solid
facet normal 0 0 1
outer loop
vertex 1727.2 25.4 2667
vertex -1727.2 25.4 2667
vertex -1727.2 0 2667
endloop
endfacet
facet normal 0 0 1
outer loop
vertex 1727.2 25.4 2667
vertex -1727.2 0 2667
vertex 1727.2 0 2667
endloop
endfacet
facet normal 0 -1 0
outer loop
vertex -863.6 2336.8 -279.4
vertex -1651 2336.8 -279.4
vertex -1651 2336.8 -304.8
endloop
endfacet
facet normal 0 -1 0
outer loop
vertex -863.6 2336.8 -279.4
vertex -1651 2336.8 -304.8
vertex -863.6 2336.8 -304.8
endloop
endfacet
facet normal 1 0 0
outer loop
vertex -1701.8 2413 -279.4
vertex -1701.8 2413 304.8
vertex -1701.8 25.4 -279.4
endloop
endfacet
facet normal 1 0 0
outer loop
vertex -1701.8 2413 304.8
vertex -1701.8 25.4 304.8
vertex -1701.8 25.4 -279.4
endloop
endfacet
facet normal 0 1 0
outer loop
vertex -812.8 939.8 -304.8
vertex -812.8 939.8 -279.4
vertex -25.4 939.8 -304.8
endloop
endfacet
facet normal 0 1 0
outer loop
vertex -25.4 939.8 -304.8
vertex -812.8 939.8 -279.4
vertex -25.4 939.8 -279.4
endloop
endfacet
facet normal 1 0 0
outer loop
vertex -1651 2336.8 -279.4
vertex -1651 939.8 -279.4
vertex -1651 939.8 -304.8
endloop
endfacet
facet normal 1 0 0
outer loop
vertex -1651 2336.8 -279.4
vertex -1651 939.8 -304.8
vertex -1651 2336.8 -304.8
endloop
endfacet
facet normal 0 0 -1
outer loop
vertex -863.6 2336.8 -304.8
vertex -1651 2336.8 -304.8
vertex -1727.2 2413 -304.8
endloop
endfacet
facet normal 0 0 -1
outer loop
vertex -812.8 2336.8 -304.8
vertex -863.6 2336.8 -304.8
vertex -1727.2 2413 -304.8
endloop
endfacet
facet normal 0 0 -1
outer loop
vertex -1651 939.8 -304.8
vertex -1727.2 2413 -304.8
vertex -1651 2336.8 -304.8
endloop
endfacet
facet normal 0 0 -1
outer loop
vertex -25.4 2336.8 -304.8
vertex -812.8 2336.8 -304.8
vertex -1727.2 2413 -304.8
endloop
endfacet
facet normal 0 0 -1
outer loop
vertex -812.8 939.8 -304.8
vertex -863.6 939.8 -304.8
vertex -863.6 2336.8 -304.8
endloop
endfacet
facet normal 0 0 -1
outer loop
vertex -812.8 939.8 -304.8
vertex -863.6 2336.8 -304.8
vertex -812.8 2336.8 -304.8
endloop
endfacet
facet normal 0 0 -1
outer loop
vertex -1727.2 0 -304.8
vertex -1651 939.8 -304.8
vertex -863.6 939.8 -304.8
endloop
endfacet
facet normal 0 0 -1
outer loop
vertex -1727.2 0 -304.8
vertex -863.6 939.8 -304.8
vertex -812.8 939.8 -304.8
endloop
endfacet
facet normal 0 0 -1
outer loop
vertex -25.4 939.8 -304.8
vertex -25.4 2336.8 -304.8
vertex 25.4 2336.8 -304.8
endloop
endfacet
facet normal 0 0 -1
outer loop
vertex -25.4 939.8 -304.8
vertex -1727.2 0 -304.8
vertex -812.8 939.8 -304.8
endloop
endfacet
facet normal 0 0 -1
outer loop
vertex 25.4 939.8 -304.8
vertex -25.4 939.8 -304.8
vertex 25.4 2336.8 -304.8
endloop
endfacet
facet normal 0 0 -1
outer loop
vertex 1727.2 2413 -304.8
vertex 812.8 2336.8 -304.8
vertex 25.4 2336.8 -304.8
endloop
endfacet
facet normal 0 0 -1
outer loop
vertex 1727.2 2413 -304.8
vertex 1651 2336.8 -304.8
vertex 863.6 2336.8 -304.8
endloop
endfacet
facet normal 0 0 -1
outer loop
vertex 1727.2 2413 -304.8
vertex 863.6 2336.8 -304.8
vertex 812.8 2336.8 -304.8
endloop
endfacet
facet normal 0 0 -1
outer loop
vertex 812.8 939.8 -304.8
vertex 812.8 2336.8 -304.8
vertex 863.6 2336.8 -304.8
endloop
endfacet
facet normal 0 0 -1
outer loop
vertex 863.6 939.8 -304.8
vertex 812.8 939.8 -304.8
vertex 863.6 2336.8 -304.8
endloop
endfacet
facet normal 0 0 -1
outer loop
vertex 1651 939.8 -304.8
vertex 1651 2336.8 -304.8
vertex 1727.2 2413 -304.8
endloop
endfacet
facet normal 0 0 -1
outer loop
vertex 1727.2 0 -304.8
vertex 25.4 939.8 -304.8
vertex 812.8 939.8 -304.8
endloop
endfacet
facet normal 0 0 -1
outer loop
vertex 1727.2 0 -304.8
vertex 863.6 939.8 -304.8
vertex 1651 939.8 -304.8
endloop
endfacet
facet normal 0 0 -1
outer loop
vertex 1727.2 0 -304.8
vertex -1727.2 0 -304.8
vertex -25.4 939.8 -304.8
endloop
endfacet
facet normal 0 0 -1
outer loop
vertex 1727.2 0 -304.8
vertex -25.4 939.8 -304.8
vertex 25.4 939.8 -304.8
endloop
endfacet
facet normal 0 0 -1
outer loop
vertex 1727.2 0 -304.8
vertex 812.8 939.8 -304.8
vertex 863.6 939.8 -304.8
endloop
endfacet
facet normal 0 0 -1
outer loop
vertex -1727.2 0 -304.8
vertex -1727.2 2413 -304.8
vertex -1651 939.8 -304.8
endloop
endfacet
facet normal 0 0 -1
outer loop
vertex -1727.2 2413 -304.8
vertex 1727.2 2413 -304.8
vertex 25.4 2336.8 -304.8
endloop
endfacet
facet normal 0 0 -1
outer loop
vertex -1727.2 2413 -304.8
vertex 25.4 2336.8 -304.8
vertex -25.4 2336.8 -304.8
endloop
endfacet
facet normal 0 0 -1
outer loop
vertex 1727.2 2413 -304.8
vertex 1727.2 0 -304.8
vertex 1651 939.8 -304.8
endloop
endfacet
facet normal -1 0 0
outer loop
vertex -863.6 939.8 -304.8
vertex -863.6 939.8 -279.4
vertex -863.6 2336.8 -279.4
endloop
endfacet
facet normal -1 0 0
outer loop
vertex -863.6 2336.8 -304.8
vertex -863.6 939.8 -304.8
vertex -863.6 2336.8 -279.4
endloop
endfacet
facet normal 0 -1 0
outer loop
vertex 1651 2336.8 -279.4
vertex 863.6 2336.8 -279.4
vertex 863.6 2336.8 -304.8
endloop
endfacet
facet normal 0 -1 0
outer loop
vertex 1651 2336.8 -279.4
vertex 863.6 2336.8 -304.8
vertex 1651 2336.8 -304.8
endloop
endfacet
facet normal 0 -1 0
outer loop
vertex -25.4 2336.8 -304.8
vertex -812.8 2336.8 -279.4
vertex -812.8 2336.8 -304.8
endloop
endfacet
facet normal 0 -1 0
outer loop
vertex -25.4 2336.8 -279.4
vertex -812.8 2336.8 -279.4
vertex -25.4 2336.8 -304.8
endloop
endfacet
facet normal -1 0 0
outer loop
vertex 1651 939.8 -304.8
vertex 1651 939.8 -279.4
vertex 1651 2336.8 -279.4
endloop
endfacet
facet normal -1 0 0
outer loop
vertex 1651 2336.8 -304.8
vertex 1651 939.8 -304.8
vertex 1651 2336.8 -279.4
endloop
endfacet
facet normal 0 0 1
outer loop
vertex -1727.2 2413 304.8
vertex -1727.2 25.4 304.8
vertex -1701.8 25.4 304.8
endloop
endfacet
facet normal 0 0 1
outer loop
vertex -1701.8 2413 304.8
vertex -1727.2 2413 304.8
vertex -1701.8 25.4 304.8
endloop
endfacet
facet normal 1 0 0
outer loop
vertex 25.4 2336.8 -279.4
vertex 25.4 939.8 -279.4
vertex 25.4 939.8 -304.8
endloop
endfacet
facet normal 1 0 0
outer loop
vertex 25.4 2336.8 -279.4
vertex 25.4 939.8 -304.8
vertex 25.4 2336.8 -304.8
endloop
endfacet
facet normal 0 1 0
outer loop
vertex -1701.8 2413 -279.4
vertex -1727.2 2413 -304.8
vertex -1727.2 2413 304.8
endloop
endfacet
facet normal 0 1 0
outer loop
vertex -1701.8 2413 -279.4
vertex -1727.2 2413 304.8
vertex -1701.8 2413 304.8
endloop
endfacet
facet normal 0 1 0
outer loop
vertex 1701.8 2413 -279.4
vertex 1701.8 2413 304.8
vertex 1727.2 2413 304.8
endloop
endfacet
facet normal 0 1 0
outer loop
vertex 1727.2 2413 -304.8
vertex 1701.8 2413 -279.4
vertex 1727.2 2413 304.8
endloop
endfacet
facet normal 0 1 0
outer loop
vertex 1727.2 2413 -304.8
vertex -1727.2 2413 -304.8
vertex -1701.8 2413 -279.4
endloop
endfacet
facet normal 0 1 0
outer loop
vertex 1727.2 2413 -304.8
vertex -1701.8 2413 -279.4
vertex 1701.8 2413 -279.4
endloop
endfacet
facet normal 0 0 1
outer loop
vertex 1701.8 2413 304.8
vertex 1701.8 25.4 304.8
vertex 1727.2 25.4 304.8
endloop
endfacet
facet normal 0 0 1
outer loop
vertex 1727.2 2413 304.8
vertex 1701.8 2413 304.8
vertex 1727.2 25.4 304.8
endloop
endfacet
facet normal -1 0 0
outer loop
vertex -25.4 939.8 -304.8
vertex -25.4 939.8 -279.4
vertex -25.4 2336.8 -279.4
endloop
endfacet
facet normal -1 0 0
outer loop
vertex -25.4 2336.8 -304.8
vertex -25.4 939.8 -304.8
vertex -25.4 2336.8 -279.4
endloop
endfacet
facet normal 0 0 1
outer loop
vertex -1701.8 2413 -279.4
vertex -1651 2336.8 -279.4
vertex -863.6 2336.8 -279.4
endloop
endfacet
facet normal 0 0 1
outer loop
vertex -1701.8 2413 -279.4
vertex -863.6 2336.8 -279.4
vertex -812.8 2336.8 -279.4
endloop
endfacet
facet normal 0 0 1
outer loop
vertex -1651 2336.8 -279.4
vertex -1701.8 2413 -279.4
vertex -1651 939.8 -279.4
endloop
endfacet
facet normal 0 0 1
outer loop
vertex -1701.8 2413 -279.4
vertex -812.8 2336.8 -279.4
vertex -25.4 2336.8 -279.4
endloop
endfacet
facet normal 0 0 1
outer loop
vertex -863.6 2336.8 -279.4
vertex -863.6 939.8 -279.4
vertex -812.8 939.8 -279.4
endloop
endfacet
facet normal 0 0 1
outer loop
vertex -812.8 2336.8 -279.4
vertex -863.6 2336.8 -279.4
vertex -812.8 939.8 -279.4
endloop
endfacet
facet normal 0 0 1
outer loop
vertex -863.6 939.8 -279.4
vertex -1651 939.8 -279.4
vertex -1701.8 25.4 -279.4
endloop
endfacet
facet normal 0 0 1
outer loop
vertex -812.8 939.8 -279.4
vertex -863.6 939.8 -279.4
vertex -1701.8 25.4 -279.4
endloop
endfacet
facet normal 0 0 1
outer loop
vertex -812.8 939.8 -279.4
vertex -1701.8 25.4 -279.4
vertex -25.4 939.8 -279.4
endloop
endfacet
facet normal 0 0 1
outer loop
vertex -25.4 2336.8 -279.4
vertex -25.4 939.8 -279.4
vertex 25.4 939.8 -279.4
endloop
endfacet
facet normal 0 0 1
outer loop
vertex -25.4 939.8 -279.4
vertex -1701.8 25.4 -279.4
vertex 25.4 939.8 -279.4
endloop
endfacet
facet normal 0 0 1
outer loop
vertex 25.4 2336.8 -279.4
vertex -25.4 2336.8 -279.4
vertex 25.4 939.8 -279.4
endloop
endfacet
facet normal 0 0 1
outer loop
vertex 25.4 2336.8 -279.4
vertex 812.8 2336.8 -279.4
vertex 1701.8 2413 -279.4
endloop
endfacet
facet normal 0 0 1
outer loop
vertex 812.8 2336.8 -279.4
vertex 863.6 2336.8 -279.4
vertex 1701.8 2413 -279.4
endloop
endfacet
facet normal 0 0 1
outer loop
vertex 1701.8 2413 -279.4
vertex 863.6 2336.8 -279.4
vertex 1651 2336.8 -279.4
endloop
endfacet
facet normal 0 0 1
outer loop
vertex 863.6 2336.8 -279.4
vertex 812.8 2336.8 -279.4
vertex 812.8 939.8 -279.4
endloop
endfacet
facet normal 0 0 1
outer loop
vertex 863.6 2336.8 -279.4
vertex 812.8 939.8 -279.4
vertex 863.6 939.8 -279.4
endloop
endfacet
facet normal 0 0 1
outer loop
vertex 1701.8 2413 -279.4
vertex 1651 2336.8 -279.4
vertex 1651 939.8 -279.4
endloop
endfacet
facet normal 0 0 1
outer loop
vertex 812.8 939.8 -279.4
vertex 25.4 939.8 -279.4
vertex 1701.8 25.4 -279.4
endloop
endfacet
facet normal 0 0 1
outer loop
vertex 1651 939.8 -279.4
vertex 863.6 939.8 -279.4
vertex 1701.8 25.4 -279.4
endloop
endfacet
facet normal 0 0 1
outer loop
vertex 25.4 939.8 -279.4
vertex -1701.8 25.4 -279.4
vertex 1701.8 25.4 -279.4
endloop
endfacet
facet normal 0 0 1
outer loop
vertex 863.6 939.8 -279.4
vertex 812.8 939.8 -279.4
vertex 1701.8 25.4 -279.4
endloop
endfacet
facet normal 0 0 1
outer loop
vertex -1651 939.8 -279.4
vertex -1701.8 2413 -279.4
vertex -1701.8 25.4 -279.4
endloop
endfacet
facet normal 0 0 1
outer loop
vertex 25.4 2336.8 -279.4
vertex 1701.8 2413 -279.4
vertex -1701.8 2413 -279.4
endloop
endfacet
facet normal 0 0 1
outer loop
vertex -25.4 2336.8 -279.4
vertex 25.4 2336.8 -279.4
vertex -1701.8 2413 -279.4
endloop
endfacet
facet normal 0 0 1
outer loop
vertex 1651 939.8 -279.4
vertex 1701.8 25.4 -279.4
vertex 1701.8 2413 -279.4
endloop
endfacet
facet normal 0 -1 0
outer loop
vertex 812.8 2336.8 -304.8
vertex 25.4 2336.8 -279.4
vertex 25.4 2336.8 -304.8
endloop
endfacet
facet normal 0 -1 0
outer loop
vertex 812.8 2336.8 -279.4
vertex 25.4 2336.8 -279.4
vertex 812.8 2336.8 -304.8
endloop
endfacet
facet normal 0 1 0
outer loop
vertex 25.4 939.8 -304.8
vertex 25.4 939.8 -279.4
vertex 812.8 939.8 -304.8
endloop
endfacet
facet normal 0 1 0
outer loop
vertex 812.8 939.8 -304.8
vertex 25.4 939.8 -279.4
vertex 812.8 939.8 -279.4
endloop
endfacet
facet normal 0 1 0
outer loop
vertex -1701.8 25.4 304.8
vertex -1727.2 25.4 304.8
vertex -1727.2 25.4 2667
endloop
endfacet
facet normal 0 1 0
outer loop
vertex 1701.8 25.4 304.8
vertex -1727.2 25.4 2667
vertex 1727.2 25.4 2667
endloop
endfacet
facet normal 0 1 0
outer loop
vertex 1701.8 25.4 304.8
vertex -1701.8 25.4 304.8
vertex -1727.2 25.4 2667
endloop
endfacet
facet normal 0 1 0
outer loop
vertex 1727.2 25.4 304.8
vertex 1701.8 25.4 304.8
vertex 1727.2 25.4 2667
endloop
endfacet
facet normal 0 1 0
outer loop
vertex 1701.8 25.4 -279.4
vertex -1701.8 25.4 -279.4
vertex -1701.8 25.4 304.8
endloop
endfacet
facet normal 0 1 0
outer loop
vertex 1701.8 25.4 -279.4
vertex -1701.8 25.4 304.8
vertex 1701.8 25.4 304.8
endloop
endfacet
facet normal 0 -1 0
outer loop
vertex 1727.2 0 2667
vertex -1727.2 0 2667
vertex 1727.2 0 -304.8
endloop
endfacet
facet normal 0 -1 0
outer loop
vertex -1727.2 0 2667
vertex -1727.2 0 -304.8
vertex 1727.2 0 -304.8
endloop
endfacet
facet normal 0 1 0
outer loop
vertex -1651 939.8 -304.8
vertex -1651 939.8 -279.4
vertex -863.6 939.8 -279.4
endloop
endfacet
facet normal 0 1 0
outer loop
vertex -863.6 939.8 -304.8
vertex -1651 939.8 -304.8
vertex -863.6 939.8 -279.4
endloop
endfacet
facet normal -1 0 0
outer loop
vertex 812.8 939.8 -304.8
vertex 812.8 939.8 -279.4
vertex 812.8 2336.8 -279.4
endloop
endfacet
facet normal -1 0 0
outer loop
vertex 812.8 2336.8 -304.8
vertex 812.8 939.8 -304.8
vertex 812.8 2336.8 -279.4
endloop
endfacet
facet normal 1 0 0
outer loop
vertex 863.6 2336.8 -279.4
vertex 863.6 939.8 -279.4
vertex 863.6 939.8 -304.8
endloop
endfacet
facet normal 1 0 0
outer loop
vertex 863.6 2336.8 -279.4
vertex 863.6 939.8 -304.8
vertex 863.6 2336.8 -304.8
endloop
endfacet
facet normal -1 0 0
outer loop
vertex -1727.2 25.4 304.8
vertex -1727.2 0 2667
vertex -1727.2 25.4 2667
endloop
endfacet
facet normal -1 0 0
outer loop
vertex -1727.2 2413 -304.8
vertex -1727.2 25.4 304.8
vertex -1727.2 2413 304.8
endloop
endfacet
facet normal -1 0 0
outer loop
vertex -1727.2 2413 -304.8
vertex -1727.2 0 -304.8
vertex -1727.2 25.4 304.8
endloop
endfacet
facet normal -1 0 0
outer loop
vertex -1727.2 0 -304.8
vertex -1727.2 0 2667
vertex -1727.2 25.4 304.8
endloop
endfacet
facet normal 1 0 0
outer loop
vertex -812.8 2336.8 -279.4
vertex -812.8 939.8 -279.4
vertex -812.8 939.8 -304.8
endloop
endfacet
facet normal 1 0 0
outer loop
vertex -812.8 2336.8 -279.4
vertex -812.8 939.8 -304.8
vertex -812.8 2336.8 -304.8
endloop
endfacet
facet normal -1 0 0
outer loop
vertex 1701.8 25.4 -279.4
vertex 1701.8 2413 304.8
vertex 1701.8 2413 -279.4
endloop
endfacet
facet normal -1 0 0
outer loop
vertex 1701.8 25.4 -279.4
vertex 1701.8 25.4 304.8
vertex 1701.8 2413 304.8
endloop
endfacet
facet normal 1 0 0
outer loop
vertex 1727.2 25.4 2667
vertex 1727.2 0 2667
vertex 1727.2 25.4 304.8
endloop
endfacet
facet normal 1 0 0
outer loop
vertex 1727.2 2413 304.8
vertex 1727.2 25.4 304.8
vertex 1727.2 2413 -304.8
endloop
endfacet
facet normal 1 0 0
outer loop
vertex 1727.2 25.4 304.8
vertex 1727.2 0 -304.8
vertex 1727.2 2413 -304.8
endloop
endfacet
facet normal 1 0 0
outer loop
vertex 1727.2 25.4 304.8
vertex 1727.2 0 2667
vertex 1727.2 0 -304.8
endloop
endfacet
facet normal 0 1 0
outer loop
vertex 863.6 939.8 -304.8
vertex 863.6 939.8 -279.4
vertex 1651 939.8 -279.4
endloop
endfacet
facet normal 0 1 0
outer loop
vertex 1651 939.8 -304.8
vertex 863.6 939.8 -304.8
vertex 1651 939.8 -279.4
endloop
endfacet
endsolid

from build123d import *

# Parameters (mm, degrees)
SKETCH1_W           = 3454.4
SKETCH1_H           = 609.6
BOSS_EXTRUDE1_DEPTH = 2413
SHELL1_T            = -25.4
SKETCH2_W           = 3454.4
SKETCH2_H           = 25.4
BOSS_EXTRUDE2_DEPTH = 2362.2
SKETCH3_W           = 787.4
SKETCH3_H           = 1397
CUT_EXTRUDE1_DEPTH  = 25.4


with BuildPart() as part:
    # Sketch1 → Boss-Extrude1 (new body)
    with BuildSketch(Plane(origin=(0, 0, 0), x_dir=(1, 0, 0), z_dir=(0, 1, 0))):
        Rectangle(SKETCH1_W, SKETCH1_H)
    extrude(amount=BOSS_EXTRUDE1_DEPTH)

    # Shell1
    shell1_openings = [part.faces().sort_by_distance(p)[0] for p in [
        (0, 2413, 0),
        (0, 1206.5, 304.8),
    ]]
    offset(amount=SHELL1_T, openings=shell1_openings, kind=Kind.INTERSECTION)

    # Sketch2 → Boss-Extrude2 (add)
    with BuildSketch(Plane.XY.offset(304.8)):
        with Locations((0, 12.7)):
            Rectangle(SKETCH2_W, SKETCH2_H)
    extrude(amount=BOSS_EXTRUDE2_DEPTH)

    # Sketch3 → Cut-Extrude1 (cut)
    with BuildSketch(Plane.XY.offset(-279.4)):
        with Locations((-1257.3, 1638.3)):
            Rectangle(SKETCH3_W, SKETCH3_H)
        with Locations((-419.1, 1638.3)):
            Rectangle(SKETCH3_W, SKETCH3_H)
        with Locations((419.1, 1638.3)):
            Rectangle(SKETCH3_W, SKETCH3_H)
        with Locations((1257.3, 1638.3)):
            Rectangle(SKETCH3_W, SKETCH3_H)
    extrude(amount=-CUT_EXTRUDE1_DEPTH, mode=Mode.SUBTRACT)


solid = part.part
